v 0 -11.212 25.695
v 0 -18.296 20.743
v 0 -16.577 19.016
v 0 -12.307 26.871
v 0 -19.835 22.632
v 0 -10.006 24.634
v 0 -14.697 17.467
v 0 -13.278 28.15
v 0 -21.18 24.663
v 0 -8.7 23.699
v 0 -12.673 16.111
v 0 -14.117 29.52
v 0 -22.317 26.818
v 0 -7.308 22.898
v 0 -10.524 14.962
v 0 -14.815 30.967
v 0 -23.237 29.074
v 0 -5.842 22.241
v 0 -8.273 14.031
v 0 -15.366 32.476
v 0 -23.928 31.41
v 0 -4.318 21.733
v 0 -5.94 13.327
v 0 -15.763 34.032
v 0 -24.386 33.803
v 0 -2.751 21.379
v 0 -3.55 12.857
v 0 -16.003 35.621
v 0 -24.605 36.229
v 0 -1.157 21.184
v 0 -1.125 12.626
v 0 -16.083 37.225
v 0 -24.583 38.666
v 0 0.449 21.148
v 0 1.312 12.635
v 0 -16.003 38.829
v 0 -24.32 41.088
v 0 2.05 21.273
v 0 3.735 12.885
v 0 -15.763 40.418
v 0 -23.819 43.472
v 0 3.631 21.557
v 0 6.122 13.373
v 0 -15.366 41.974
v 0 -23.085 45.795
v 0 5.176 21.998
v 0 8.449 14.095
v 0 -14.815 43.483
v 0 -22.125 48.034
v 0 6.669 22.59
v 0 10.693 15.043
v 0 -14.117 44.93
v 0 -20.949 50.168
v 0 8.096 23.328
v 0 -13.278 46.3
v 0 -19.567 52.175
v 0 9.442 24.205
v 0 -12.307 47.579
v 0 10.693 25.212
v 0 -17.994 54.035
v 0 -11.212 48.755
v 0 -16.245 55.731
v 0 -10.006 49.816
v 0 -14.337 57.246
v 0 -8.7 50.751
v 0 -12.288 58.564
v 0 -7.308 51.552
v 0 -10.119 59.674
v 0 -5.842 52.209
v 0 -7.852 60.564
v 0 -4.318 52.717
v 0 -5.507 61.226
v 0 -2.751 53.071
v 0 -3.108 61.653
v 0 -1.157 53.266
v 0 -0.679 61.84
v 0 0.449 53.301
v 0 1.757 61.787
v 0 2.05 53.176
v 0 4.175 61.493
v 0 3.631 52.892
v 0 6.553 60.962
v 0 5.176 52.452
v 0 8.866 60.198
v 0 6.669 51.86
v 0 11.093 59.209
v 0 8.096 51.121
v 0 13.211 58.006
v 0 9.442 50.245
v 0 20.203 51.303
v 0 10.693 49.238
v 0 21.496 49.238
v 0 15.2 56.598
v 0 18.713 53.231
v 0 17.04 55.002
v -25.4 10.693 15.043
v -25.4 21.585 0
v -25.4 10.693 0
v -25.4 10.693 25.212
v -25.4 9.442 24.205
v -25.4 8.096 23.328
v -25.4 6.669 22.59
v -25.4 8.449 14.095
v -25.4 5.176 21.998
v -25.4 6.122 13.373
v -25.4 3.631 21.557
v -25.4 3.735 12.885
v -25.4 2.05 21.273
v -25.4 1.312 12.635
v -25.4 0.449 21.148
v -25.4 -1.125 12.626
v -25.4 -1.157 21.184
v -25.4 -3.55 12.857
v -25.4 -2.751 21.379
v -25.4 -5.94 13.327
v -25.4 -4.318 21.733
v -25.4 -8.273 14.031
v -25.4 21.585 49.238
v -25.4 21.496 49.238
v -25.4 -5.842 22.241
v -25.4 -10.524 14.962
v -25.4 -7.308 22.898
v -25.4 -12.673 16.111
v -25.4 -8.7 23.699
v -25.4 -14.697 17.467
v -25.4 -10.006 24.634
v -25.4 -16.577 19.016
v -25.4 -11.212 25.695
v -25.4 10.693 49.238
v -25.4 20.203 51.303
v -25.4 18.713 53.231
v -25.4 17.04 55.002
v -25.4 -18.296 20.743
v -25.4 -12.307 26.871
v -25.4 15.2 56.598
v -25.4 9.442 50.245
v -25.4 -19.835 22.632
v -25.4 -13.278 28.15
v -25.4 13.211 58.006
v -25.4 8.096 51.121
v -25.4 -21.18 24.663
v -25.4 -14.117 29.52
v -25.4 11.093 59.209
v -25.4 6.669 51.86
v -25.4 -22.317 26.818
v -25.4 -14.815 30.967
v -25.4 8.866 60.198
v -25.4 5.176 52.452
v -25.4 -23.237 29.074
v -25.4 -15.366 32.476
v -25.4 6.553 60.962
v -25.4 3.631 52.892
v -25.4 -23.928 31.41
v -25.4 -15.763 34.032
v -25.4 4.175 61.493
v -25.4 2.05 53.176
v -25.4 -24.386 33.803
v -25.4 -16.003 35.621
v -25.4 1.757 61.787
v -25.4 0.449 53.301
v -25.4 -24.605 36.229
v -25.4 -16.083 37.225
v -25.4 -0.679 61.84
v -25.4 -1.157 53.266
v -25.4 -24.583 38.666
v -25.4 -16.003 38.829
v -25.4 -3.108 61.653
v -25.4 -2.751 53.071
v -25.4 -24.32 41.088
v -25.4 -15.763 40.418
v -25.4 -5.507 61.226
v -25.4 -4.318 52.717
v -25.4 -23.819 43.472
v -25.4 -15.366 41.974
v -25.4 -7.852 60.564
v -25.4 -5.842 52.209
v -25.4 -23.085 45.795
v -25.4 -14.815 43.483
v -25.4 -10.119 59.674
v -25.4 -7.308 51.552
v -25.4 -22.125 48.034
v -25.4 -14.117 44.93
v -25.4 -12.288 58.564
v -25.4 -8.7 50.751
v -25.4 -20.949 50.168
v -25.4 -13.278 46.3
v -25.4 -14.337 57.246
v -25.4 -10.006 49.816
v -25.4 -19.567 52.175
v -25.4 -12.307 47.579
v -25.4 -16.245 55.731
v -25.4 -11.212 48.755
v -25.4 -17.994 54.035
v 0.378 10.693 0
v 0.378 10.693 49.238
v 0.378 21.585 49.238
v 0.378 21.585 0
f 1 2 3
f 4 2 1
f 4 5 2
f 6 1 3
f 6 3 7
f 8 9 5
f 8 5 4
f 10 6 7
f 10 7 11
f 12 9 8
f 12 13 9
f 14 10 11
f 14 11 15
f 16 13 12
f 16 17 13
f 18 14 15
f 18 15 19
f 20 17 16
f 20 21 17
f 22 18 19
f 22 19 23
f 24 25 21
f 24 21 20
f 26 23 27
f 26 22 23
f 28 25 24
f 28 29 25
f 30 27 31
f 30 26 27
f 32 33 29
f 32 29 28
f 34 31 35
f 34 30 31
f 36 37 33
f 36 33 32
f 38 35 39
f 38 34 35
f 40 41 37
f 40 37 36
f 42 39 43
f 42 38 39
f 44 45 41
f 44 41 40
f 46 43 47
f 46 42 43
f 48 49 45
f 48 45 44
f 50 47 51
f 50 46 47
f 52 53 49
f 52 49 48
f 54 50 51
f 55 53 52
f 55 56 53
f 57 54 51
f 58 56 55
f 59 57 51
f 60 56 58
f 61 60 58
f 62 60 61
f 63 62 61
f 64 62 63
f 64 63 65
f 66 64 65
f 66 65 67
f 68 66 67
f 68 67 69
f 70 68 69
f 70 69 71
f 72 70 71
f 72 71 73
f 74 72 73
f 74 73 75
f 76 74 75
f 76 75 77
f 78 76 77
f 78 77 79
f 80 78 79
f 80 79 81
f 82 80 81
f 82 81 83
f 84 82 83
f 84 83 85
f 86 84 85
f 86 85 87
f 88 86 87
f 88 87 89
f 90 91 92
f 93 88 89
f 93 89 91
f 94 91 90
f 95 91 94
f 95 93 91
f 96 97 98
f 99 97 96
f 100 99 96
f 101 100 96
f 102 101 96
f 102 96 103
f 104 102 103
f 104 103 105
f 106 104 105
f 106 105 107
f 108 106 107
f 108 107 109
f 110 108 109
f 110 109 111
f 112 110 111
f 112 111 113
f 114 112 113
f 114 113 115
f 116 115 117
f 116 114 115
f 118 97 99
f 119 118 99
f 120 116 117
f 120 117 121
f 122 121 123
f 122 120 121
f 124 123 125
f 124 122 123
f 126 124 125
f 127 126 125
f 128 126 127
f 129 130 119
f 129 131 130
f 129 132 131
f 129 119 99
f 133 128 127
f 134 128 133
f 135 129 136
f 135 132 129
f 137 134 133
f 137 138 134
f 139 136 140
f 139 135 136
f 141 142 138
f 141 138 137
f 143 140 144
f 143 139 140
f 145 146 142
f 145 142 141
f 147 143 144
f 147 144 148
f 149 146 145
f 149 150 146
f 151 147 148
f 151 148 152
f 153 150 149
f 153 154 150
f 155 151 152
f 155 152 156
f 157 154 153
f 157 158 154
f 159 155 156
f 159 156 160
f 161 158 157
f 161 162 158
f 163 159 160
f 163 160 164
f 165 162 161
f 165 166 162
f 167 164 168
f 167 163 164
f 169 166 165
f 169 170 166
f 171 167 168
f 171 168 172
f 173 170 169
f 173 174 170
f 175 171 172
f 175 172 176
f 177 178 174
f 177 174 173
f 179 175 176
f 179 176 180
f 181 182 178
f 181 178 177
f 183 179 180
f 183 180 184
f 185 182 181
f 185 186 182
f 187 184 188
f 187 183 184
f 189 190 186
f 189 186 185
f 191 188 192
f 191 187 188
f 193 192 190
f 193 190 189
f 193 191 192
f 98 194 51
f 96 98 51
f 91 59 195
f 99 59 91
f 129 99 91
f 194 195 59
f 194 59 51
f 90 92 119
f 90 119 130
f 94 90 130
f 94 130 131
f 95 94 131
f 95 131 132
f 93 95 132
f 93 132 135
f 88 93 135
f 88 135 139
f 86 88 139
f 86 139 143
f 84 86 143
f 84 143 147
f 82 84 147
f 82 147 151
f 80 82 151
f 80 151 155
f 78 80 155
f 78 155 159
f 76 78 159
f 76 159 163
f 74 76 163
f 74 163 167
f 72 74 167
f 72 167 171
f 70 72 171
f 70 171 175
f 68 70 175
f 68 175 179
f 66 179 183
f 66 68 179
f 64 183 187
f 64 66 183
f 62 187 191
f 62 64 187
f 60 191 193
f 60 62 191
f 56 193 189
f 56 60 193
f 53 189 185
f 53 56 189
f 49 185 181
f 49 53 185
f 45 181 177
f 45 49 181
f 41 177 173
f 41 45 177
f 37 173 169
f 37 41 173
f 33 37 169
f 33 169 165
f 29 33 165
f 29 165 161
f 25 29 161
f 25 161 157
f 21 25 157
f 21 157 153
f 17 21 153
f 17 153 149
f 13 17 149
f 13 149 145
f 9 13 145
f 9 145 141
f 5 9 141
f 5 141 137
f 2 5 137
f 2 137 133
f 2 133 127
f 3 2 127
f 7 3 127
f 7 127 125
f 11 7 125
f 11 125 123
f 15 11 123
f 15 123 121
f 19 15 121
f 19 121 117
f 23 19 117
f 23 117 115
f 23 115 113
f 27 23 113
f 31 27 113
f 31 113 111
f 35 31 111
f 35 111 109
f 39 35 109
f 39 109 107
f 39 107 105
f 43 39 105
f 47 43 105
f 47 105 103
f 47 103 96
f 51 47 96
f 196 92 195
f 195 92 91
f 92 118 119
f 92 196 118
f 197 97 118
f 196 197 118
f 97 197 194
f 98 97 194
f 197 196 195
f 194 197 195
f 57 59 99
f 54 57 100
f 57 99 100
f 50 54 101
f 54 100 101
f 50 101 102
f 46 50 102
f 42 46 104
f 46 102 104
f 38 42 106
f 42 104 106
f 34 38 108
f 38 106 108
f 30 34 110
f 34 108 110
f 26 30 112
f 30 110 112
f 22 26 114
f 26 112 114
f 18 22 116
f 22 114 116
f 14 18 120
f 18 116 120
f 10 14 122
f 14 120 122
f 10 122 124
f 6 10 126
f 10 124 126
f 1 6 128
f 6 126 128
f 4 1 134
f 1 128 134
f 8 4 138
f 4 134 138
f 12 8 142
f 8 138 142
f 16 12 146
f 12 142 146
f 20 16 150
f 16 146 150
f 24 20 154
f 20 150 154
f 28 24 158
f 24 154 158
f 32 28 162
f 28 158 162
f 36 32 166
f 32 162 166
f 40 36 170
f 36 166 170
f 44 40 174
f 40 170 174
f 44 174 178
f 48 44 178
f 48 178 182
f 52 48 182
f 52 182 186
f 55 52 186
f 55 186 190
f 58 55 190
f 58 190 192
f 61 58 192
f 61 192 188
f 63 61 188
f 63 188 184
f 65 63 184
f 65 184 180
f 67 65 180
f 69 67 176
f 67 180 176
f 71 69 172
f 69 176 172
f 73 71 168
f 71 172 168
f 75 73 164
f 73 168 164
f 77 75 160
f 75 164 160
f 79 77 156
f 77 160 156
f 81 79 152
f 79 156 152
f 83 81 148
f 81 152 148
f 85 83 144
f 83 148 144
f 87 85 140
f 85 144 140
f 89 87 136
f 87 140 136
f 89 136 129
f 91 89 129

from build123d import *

# Parameters (mm, degrees)
F0_R     = 24.6246836301
F1_DEPTH = 25.4
F2_R     = 16.0828148766
F3_DEPTH = 25.401
F4_W     = 28.0453877614
F4_H     = 49.2377767596
F5_DEPTH = 25.77823
F6_DEPTH = 17.15412


with BuildPart() as f1:
    # F0 (on Right) → F1 (new body)
    with BuildSketch(Plane.YZ):
        with Locations((0, 37.2249111533)):
            Circle(F0_R)
    extrude(amount=-F1_DEPTH)

    # F2 (on face) → F3 (cut, through all)
    with BuildSketch(Plane(origin=(-25.4, 0, 0), x_dir=(0, -1, 0), z_dir=(-1, 0, 0))):
        with Locations((0, 37.2249111533)):
            Circle(F2_R)
    extrude(amount=-F3_DEPTH, mode=Mode.SUBTRACT)

    # F4 (on face) → F5 (join)
    with BuildSketch(Plane(origin=(-25.4, 0, 0), x_dir=(0, -1, 0), z_dir=(-1, 0, 0))):
        with Locations((-24.7160560406, 24.6188883798)):
            Rectangle(F4_W, F4_H)
    extrude(amount=-F5_DEPTH)

    # F6 (cut): a face of the model
    f6_faces = [f1.faces().sort_by_distance(p)[0] for p in [
        (-12.510885, 38.7387499213, 24.6188883798),
    ]]
    extrude(f6_faces, amount=-F6_DEPTH, mode=Mode.SUBTRACT)


solid = f1.part
